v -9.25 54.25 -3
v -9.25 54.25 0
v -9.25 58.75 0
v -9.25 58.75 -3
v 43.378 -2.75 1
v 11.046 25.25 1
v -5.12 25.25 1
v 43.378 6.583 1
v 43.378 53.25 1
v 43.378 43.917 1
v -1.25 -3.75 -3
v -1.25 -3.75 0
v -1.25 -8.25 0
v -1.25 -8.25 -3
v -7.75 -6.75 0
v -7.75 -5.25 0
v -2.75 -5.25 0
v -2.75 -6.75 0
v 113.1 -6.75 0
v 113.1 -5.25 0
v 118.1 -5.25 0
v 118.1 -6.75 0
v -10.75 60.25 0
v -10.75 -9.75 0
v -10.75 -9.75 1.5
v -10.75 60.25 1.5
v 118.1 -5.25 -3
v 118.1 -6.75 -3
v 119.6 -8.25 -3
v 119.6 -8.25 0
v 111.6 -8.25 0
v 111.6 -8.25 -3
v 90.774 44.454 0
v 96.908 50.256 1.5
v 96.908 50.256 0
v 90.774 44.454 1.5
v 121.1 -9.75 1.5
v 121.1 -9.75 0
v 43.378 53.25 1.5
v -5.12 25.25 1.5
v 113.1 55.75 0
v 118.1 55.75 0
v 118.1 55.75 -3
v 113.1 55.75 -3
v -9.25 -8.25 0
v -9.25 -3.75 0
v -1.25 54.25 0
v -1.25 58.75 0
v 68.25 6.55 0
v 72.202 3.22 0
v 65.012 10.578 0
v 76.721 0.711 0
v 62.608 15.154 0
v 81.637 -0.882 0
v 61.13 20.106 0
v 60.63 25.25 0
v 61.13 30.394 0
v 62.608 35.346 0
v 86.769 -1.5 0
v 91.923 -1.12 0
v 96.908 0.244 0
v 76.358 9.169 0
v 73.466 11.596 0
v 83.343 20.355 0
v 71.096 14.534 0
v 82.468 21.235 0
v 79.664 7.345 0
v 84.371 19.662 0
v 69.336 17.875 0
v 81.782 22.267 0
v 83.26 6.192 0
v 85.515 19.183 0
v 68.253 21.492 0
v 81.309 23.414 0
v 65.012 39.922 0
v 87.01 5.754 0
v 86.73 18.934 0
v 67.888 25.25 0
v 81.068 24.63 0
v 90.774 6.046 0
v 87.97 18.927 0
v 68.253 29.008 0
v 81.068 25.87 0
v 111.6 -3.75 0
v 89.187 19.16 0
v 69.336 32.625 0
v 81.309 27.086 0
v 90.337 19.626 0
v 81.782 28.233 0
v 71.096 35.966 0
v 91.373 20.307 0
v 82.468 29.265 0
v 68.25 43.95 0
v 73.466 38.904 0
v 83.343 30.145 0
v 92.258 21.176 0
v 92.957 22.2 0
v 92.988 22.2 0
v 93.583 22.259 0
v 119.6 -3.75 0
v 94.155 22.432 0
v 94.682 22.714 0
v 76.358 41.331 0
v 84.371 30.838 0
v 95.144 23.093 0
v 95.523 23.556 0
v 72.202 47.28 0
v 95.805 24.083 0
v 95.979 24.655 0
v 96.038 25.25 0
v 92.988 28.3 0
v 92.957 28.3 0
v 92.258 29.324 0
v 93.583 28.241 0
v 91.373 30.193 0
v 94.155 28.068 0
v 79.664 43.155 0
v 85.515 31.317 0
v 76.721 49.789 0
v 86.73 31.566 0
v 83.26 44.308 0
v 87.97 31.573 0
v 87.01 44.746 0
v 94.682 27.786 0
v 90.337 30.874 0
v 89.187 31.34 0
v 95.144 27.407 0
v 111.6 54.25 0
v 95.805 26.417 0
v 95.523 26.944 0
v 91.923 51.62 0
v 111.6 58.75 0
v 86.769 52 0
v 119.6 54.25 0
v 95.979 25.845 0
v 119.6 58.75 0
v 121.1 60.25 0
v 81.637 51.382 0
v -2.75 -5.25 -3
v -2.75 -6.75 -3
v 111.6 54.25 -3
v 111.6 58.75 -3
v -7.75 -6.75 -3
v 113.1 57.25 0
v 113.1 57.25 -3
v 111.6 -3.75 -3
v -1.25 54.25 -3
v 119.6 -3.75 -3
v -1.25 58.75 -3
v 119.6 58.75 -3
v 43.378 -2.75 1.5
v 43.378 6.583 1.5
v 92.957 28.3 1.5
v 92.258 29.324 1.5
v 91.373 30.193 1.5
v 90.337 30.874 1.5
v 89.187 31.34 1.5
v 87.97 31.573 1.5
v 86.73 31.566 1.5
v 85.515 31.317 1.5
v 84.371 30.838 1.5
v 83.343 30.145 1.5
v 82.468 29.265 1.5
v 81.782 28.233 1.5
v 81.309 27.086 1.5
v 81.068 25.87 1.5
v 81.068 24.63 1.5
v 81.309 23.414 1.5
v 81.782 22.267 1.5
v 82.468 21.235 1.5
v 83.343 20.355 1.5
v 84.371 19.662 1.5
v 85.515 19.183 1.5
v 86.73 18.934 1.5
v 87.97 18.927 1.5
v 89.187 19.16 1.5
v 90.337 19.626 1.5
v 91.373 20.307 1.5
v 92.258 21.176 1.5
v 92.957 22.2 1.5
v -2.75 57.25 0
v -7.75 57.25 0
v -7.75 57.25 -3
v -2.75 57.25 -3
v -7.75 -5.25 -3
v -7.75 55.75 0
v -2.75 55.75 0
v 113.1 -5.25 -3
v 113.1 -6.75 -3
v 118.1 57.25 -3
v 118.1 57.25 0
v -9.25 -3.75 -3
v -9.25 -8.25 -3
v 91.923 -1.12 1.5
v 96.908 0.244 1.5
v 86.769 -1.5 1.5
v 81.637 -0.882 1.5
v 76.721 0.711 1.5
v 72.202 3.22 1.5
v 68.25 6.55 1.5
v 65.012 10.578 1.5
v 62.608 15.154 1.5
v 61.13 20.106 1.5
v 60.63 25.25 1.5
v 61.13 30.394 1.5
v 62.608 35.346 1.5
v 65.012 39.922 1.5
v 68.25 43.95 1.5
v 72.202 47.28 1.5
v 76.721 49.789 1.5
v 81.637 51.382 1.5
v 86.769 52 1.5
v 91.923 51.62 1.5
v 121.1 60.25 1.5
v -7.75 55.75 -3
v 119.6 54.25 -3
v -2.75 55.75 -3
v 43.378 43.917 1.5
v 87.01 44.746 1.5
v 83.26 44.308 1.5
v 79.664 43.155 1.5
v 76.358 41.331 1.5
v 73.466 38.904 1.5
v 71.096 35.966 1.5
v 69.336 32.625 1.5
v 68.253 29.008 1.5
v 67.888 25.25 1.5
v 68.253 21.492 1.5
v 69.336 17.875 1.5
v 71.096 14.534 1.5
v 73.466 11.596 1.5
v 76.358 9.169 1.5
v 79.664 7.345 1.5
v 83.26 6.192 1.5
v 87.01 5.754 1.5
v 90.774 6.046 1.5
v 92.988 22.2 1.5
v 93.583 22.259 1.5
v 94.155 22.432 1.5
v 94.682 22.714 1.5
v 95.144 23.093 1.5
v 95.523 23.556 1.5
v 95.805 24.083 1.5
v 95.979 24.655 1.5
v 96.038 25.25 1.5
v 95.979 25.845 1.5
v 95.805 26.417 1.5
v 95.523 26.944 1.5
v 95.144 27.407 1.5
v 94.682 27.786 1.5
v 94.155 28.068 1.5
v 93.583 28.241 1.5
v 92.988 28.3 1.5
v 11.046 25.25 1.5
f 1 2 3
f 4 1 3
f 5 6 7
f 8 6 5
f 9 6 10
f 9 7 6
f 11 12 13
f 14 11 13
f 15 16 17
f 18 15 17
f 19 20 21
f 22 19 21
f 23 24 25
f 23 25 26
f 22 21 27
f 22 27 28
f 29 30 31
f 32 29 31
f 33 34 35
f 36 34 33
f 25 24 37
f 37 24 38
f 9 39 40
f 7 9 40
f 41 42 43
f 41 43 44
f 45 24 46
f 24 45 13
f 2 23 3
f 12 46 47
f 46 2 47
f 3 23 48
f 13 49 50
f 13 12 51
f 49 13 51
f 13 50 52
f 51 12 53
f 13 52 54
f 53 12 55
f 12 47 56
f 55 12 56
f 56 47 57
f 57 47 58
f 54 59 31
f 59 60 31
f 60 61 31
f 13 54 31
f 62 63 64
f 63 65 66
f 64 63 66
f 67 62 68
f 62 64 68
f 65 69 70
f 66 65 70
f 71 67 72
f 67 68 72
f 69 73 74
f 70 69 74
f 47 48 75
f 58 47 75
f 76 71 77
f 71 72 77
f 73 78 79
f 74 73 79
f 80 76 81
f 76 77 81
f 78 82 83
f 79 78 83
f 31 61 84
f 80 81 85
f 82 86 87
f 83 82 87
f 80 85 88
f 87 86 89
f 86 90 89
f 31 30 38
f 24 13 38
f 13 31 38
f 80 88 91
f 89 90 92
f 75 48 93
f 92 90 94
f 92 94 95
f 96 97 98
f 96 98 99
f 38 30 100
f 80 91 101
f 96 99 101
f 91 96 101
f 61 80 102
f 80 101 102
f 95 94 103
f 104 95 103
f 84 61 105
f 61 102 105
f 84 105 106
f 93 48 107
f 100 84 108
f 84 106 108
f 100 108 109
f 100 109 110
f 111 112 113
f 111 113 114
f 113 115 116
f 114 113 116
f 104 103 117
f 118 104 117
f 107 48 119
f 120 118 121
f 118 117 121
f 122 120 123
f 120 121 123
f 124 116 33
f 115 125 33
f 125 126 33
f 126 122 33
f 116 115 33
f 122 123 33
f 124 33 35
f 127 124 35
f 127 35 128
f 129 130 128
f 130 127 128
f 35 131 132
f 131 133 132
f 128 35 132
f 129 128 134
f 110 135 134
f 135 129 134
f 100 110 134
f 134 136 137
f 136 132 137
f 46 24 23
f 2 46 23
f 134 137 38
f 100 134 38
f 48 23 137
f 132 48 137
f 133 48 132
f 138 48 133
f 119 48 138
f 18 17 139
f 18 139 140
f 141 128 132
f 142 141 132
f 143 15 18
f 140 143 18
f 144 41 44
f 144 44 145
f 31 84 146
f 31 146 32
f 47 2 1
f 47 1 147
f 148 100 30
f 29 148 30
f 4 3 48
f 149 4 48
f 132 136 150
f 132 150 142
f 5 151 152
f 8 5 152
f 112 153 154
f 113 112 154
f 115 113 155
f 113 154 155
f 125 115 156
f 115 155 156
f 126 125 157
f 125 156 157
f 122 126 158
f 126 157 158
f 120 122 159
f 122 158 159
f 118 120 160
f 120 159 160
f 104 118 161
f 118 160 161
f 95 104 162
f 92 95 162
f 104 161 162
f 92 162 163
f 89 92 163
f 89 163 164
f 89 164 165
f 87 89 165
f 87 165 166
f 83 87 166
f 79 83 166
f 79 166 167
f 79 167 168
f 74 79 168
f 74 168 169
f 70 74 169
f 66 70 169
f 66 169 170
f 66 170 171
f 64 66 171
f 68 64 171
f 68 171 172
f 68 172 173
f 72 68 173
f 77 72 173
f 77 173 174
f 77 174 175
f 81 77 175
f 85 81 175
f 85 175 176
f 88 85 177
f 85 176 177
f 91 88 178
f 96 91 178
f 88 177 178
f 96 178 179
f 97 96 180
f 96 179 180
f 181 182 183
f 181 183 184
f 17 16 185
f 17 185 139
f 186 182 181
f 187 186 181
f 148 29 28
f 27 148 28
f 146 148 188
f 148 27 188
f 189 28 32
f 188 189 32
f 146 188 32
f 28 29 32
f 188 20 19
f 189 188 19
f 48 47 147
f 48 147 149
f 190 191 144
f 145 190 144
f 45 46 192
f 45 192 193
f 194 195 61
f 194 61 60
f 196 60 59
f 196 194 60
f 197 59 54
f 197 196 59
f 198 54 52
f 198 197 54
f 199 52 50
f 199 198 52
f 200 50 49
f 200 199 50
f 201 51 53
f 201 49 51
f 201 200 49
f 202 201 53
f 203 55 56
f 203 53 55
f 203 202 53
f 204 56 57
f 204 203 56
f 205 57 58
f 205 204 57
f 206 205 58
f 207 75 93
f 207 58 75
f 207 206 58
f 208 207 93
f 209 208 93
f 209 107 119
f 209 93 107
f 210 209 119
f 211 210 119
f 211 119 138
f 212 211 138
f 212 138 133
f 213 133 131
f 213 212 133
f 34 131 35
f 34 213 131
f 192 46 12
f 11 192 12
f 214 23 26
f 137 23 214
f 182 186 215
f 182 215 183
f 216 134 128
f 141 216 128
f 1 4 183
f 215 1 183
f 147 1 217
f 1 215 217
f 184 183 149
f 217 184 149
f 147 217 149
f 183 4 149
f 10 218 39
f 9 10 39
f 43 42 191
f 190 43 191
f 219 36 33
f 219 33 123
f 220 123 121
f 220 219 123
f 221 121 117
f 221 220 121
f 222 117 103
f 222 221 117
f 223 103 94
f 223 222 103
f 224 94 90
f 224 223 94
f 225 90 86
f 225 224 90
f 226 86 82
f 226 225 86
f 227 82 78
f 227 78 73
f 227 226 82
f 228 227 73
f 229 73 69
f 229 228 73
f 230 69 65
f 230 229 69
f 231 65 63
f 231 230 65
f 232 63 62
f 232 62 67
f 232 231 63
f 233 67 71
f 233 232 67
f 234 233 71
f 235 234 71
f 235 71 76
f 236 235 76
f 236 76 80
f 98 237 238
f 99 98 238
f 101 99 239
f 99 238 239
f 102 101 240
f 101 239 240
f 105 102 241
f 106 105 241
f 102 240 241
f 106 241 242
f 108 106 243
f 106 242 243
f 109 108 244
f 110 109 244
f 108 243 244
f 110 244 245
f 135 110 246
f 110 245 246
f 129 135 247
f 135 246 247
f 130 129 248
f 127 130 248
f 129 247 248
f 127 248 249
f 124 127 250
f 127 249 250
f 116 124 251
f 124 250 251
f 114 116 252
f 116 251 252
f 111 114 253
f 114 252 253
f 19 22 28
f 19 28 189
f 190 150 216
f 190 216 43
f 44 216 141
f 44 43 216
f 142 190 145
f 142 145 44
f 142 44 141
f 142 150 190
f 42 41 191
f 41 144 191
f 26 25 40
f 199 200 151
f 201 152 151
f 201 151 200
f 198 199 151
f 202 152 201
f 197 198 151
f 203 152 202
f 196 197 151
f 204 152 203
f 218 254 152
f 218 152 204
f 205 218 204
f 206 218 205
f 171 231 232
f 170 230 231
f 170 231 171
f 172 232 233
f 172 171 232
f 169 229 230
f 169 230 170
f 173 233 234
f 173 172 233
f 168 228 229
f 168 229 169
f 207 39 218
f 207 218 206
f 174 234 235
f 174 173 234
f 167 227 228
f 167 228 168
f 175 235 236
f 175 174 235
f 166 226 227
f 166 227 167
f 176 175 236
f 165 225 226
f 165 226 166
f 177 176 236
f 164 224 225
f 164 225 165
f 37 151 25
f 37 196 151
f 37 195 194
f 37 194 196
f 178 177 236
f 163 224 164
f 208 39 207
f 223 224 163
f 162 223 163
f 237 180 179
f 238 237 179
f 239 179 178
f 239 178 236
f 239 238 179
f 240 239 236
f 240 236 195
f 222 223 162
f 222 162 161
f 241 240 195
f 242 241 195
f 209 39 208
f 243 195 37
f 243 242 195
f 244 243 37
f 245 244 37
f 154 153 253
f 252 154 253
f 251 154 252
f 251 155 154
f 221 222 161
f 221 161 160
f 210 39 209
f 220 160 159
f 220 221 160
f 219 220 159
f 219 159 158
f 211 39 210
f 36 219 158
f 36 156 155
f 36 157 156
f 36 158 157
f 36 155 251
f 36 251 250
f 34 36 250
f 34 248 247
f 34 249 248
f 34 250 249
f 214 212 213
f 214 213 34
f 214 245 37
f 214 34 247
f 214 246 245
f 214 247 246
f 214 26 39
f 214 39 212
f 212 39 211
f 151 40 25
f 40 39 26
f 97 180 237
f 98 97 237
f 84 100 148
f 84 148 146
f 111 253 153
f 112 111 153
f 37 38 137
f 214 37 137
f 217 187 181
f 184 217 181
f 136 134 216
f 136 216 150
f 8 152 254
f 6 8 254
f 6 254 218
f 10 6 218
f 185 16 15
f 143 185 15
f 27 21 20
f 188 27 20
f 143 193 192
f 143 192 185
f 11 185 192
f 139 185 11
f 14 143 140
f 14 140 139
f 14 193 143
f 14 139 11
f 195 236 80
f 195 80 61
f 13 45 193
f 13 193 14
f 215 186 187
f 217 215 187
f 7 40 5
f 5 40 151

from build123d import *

# Parameters (mm, degrees)
SKETCH1_W                 = 131.85
SKETCH1_H                 = 70
BOSS_EXTRUDE1_DEPTH       = 1.5
CUT_EXTRUDE1_REACH        = 137.268
SKETCH4_W                 = 8
SKETCH4_H                 = 4.5
SKETCH4_W_2               = 5
SKETCH4_H_2               = 1.5
BOSS_EXTRUDE2_DEPTH       = 3
MIRROR2_COPY_1_SKETCH_W   = 8
MIRROR2_COPY_1_SKETCH_H   = 4.5
MIRROR2_COPY_1_SKETCH_W_2 = 5
MIRROR2_COPY_1_SKETCH_H_2 = 1.5
MIRROR2_COPY_1_DEPTH      = 3
CUT_EXTRUDE2_REACH        = 137.335
CUT_EXTRUDE3_DEPTH        = 0.5


with BuildPart() as part:
    # Sketch1 → Boss-Extrude1 (new body)
    with BuildSketch(Plane.XY):
        with Locations((55.175, 25.25)):
            Rectangle(SKETCH1_W, SKETCH1_H)
    extrude(amount=BOSS_EXTRUDE1_DEPTH)

    # Sketch2 → Cut-Extrude1 (cut, up to next)
    with BuildSketch(Plane.XY.offset(1.5), mode=Mode.PRIVATE) as cut_extrude1_sk1:
        with BuildLine():
            Line((92.957060126, 22.2), (92.9875, 22.2))
            ThreePointArc((92.9875, 22.2), (96.0375, 25.25), (92.9875, 28.3))
            Line((92.9875, 28.3), (92.957060126, 28.3))
            ThreePointArc((92.957060126, 28.3), (81.0375, 25.25), (92.957060126, 22.2))
        make_face()
    cut_extrude1_tool1 = extrude(cut_extrude1_sk1.sketch, amount=-CUT_EXTRUDE1_REACH, mode=Mode.PRIVATE) & part.part
    add(cut_extrude1_tool1.solids().sort_by_distance((87.98685, 25.25, 1.5))[0], mode=Mode.SUBTRACT)

    # Sketch4 → Boss-Extrude2 (add)
    with BuildSketch(Plane(origin=(0, 0, 0), x_dir=(-1, 0, 0), z_dir=(0, 0, -1))):
        with Locations((-115.6, 56.5)):
            Rectangle(SKETCH4_W, SKETCH4_H)
        with Locations((-115.6, 56.5)):
            Rectangle(SKETCH4_W_2, SKETCH4_H_2, mode=Mode.SUBTRACT)
    boss_extrude2 = extrude(amount=BOSS_EXTRUDE2_DEPTH)

    # Mirror1: Boss-Extrude2 across plane
    add(boss_extrude2.mirror(Plane.ZX.offset(25.25)))

    # Mirror2: Boss-Extrude2 across plane
    add(boss_extrude2.mirror(Plane(origin=(55.175, 0, 0), x_dir=(0, 0, 1), z_dir=(1, 0, 0))))

    # Mirror2 copy 1 sketch → Mirror2 copy 1 (add)
    with BuildSketch(Plane(origin=(110.35, 50.5, 0), x_dir=(1, 0, 0), z_dir=(0, 0, -1))):
        with Locations((-115.6, 56.5)):
            Rectangle(MIRROR2_COPY_1_SKETCH_W, MIRROR2_COPY_1_SKETCH_H)
        with Locations((-115.6, 56.5)):
            Rectangle(MIRROR2_COPY_1_SKETCH_W_2, MIRROR2_COPY_1_SKETCH_H_2, mode=Mode.SUBTRACT)
    extrude(amount=MIRROR2_COPY_1_DEPTH)

    # Sketch5 → Cut-Extrude2 (cut, up to next)
    with BuildSketch(Plane.XY.offset(1.5), mode=Mode.PRIVATE) as cut_extrude2_sk1:
        with BuildLine():
            Line((90.774215328, 6.046350365), (96.908092333, 0.244034279))
            ThreePointArc((96.908092333, 0.244034279), (60.630444856, 25.25), (96.908092333, 50.255965721))
            Line((96.908092333, 50.255965721), (90.774215328, 44.453649635))
            ThreePointArc((90.774215328, 44.453649635), (67.8875, 25.25), (90.774215328, 6.046350365))
        make_face()
    cut_extrude2_tool1 = extrude(cut_extrude2_sk1.sketch, amount=-CUT_EXTRUDE2_REACH, mode=Mode.PRIVATE) & part.part
    add(cut_extrude2_tool1.solids().sort_by_distance((61.276961, 25.25, 1.5))[0], mode=Mode.SUBTRACT)

    # Sketch6 → Cut-Extrude3 (cut)
    with BuildSketch(Plane.XY.offset(1.5)):
        Polygon((-5.119922612, 25.25), (43.3775, -2.75), (43.3775, 6.583333333), (11.045884925, 25.25), (43.3775, 43.916666667), (43.3775, 53.25), align=None)
    extrude(amount=-CUT_EXTRUDE3_DEPTH, mode=Mode.SUBTRACT)


solid = part.part
